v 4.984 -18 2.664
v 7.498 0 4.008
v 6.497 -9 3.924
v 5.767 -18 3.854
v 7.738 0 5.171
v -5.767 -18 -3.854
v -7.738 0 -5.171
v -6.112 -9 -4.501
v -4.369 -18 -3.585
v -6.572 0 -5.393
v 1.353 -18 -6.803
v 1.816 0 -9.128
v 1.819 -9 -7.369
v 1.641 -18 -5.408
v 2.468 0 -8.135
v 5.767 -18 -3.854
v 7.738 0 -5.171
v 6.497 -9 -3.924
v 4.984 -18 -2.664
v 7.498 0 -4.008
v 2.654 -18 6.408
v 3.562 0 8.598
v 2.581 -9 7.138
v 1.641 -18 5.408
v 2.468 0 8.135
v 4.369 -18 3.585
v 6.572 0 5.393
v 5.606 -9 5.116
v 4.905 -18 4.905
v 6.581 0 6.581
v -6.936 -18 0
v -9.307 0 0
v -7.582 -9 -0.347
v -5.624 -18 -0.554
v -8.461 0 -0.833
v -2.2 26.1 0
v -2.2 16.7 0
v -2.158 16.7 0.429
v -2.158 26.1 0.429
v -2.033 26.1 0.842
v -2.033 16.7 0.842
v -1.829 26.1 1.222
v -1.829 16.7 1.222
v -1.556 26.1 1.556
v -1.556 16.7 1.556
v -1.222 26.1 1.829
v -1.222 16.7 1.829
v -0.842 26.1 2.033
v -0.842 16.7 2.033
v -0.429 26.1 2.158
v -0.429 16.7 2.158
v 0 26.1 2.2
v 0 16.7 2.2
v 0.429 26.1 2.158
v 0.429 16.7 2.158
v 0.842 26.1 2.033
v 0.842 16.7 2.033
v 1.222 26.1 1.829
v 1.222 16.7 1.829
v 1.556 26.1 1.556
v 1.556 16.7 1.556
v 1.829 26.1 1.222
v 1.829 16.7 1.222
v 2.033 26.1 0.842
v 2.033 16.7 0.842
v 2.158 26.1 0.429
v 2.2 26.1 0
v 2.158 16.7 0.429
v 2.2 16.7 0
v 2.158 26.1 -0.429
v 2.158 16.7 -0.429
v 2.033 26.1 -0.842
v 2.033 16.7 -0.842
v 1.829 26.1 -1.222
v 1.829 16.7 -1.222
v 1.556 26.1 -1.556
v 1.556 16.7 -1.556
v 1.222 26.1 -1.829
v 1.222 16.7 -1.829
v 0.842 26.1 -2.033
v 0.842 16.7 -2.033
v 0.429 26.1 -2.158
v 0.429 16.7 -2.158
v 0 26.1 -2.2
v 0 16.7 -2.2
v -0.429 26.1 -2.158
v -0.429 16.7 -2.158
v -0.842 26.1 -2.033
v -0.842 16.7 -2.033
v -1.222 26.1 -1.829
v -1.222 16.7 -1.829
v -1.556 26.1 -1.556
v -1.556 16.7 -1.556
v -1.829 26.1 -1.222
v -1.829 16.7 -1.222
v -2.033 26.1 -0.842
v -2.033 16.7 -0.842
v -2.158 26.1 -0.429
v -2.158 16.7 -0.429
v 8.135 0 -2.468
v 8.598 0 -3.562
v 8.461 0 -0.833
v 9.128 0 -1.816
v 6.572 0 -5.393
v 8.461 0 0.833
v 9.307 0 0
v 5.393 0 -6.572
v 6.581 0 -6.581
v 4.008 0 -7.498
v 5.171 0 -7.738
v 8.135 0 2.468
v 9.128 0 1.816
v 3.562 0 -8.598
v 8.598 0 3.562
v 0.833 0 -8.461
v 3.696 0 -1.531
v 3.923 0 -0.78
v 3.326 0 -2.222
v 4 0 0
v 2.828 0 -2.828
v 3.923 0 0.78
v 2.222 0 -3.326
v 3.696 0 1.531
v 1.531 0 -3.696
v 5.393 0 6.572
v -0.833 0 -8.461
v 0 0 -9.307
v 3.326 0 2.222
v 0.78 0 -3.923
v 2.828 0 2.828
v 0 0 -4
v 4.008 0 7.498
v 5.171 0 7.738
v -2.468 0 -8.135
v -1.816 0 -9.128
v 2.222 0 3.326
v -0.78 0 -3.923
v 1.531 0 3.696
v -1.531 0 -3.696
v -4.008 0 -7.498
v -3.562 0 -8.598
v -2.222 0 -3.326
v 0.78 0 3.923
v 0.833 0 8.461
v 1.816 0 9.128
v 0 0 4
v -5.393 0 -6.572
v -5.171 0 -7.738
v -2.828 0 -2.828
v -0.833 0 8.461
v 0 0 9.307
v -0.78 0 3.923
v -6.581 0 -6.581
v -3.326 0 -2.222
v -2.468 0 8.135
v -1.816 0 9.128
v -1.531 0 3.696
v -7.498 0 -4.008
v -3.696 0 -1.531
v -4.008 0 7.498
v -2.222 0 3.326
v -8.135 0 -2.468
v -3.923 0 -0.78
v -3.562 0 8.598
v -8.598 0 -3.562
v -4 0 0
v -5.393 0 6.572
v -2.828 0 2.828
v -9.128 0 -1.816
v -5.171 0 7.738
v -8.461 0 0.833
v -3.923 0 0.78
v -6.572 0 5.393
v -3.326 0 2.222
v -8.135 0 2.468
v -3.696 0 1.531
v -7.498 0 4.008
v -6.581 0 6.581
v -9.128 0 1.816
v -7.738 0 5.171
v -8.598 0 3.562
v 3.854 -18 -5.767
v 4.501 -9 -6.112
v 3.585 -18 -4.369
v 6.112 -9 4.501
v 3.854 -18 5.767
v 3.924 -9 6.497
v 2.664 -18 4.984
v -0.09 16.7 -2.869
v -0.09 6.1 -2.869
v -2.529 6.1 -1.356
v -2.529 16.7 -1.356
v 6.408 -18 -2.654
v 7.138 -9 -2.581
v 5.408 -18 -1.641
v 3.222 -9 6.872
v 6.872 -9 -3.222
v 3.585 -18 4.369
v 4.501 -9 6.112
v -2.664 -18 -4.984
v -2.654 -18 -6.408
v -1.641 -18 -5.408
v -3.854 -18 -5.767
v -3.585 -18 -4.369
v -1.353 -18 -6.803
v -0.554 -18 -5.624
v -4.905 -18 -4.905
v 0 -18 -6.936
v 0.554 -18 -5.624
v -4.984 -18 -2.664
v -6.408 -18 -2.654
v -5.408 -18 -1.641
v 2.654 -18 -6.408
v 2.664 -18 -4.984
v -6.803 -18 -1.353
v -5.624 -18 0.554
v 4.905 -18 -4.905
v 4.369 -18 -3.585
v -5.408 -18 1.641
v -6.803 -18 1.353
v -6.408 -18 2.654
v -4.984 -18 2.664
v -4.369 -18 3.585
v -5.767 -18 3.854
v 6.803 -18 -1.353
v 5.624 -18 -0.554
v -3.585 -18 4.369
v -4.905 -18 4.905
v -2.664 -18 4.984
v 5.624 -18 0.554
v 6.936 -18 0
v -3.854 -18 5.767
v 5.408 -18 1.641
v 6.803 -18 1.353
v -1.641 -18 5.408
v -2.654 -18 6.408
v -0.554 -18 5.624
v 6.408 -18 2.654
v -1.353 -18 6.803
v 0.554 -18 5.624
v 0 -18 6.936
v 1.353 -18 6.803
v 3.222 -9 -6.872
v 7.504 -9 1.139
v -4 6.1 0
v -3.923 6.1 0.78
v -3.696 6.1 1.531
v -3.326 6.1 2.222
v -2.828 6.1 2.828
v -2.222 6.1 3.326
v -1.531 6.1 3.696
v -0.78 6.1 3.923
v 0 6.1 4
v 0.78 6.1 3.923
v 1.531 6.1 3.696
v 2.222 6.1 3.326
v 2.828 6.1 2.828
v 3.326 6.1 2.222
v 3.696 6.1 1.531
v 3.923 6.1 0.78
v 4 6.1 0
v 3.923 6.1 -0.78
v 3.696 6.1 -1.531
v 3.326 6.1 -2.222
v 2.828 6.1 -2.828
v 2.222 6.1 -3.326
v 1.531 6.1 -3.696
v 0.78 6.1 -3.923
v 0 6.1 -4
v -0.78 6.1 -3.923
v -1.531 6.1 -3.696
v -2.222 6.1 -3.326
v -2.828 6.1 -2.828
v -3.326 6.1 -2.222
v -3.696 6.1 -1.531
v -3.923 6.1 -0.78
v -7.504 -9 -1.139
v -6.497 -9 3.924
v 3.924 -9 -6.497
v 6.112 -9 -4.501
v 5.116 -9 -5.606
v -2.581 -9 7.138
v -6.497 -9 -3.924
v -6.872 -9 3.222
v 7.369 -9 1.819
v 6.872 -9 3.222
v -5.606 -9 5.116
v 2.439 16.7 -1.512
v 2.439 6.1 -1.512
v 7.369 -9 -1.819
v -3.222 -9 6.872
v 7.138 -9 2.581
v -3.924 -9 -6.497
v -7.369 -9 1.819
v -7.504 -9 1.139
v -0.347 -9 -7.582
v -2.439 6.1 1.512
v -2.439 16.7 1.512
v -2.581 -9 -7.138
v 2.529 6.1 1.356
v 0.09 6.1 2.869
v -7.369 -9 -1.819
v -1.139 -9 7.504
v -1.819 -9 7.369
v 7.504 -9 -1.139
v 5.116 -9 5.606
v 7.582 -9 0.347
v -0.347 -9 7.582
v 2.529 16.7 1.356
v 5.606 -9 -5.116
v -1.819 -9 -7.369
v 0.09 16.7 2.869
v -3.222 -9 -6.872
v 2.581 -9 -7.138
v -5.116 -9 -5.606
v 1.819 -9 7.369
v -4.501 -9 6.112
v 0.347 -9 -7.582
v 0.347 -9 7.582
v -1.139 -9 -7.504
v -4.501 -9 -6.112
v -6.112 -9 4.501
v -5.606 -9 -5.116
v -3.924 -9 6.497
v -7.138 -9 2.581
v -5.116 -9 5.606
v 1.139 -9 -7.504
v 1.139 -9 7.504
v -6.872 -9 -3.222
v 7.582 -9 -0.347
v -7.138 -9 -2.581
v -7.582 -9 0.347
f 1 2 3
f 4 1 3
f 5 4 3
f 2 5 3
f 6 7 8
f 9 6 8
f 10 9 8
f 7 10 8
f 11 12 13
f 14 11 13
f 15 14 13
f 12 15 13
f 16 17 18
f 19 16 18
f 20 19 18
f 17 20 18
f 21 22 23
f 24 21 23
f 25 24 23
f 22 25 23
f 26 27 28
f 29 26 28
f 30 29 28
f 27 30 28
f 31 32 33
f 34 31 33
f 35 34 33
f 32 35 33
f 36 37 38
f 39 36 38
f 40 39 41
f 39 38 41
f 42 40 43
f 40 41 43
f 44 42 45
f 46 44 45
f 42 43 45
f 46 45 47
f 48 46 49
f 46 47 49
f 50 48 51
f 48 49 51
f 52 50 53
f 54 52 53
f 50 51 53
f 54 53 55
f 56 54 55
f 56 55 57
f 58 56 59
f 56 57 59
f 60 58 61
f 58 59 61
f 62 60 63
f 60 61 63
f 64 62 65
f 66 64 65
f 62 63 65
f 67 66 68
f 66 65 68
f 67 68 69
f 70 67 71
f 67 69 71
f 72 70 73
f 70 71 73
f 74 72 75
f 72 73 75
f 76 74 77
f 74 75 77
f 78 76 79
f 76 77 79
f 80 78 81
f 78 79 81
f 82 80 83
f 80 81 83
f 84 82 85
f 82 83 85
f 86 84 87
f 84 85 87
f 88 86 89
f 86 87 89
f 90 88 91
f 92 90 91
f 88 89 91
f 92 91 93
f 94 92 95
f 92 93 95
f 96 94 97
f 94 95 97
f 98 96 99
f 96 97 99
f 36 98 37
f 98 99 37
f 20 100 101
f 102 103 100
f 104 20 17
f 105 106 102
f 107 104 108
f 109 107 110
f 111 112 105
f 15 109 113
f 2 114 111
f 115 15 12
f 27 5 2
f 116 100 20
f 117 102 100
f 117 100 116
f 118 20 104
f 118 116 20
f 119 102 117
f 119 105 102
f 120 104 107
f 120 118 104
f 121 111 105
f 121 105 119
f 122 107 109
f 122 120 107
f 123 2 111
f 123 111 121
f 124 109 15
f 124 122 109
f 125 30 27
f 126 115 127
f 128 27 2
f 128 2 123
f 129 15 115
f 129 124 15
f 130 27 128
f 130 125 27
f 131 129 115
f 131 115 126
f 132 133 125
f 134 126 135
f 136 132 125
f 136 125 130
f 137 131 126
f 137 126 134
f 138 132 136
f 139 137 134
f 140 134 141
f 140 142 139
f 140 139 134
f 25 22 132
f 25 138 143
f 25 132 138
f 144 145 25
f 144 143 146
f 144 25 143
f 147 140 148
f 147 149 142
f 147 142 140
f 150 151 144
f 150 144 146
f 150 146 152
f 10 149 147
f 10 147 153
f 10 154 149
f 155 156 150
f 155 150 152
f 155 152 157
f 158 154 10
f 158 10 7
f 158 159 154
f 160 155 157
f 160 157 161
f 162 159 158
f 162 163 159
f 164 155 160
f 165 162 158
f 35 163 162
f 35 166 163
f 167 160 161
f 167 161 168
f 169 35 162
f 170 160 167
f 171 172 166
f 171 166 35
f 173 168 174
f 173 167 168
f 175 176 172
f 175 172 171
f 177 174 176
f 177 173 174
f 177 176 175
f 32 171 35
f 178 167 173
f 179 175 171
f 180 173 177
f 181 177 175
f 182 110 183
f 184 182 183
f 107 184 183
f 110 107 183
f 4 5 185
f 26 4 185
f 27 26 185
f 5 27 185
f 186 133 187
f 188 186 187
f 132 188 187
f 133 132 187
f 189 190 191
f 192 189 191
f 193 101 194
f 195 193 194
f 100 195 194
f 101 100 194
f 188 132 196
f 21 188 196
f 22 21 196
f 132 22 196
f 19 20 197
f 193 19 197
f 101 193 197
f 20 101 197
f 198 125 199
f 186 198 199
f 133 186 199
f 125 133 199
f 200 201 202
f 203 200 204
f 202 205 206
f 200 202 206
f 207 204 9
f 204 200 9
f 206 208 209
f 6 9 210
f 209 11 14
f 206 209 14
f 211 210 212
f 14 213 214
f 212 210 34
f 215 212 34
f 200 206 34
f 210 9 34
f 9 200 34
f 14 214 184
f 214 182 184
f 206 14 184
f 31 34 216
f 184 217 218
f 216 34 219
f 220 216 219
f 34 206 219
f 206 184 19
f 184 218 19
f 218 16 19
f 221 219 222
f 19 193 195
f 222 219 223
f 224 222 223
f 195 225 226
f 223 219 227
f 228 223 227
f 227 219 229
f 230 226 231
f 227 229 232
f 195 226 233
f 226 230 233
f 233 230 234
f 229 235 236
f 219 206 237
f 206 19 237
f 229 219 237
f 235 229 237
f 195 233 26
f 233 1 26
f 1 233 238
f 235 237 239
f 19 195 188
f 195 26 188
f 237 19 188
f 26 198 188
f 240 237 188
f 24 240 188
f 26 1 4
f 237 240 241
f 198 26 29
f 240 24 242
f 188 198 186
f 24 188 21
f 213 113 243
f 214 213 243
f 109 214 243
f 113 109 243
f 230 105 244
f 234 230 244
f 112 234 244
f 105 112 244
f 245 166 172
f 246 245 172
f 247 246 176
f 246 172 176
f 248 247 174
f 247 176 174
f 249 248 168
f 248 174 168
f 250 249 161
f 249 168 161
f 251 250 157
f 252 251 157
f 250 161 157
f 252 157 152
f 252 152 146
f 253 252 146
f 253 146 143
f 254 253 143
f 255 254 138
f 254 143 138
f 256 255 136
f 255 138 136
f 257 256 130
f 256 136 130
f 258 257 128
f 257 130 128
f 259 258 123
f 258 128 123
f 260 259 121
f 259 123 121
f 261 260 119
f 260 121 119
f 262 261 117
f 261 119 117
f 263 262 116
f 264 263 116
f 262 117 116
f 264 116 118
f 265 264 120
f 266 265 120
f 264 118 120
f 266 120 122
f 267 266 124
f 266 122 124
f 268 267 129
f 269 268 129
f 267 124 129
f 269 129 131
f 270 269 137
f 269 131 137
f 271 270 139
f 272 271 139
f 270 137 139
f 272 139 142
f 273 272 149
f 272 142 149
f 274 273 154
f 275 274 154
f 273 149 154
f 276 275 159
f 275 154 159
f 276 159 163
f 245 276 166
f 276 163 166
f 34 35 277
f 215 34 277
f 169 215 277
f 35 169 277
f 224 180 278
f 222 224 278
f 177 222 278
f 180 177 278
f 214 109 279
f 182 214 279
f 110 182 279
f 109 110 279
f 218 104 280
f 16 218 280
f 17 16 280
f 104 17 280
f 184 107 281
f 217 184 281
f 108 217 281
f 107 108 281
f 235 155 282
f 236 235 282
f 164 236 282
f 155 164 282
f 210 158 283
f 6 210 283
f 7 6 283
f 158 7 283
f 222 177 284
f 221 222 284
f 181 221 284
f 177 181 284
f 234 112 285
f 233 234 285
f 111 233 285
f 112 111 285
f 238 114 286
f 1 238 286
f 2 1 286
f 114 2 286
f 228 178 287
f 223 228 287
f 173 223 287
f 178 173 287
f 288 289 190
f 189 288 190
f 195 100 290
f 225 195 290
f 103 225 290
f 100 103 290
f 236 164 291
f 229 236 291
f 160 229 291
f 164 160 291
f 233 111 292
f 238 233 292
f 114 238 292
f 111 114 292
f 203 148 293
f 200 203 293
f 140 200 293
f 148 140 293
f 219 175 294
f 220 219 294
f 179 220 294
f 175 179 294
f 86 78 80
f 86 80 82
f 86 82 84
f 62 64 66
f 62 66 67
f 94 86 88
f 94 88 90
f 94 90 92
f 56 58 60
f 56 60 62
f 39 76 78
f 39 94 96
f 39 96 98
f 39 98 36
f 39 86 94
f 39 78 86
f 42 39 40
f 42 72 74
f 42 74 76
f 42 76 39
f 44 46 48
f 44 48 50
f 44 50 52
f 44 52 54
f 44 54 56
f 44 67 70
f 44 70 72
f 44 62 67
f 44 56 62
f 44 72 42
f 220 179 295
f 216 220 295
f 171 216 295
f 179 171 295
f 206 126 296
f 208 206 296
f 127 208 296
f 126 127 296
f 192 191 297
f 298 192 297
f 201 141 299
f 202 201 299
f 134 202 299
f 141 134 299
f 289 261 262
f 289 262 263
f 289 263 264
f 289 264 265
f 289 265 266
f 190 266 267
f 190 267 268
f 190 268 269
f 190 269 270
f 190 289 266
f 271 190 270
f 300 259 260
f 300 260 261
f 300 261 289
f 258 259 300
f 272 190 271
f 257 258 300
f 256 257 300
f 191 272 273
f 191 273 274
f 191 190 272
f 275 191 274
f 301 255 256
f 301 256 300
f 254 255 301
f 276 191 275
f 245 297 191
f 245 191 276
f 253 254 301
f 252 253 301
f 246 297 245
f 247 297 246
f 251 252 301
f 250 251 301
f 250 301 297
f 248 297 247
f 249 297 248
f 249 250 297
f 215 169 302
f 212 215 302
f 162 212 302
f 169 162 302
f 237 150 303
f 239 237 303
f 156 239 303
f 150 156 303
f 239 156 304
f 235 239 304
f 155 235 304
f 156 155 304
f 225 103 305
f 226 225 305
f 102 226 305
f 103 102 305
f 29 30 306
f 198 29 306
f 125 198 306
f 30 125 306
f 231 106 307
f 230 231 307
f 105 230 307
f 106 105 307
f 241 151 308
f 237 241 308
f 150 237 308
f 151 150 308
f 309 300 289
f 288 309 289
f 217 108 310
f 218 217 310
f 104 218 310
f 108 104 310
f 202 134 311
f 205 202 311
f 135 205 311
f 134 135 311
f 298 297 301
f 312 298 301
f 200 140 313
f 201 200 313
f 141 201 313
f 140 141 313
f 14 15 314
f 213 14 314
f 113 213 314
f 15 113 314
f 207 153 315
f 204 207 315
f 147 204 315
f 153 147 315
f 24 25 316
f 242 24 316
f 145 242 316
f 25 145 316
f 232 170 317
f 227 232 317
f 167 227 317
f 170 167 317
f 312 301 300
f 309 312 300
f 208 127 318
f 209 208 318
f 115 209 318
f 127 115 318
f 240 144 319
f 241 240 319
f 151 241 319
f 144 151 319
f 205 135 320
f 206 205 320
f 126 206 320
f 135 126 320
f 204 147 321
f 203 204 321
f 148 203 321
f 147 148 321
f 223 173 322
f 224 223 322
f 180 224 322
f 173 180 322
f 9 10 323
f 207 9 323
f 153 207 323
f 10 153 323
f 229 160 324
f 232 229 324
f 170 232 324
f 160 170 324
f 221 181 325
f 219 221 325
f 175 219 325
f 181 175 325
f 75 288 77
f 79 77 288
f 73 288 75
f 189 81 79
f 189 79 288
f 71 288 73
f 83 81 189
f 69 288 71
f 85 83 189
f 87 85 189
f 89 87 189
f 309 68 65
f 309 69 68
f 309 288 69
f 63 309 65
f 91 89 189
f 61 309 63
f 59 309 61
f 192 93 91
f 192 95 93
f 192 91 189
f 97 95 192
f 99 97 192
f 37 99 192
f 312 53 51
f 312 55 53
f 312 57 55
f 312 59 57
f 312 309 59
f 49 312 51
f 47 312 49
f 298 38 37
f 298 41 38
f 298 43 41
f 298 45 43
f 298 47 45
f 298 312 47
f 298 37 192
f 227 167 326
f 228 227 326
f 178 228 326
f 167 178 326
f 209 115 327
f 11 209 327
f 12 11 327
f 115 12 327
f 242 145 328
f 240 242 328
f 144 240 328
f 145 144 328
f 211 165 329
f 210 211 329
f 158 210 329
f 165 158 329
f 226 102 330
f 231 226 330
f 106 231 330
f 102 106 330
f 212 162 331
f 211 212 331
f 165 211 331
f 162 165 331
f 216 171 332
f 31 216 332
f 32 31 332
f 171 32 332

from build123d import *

# Parameters (mm, degrees)
F0_R      = 8.5
F1_DEPTH  = 18
F1_TAPER  = 9
F2_R      = 4
F3_DEPTH  = 6.1
F5_DEPTH  = 10.6
F6_R      = 2.2
F7_DEPTH  = 9.4
F11_COUNT = 32


with BuildPart() as f1:
    # F0 (on Front) → F1 (new body)
    with BuildSketch(Plane.XZ):
        Circle(F0_R)
    extrude(amount=F1_DEPTH, taper=F1_TAPER)

    # F2 (on face) → F3 (join)
    with BuildSketch(Plane(origin=(0, 0, 0), x_dir=(-1, 0, 0), z_dir=(0, 1, 0))):
        Circle(F2_R)
    extrude(amount=F3_DEPTH)

    # F4 (on face) → F5 (join)
    with BuildSketch(Plane(origin=(0, 6.1, 0), x_dir=(-1, 0, 0), z_dir=(0, 1, 0))):
        Polygon((-0.0899552099, 2.868589908), (-2.5292493383, 1.356391457), (-2.4392941284, -1.512198451), (0.0899552099, -2.868589908), (2.5292493383, -1.356391457), (2.4392941284, 1.512198451), align=None)
    extrude(amount=F5_DEPTH)

    # F6 (on face) → F7 (join)
    with BuildSketch(Plane(origin=(0, 16.7, 0), x_dir=(-1, 0, 0), z_dir=(0, 1, 0))):
        Circle(F6_R)
    extrude(amount=F7_DEPTH)



with BuildPart() as f10:
    # F9 (on face) → F10 section 0
    with BuildSketch(Plane.XZ.offset(18)):
        with BuildLine():
            Line((0.555, 5.6217506779), (0, 6.9361673668))
            Line((0, 6.9361673668), (-0.555, 5.6217506779))
            ThreePointArc((-0.555, 5.6217506779), (0, 5.6490800742), (0.555, 5.6217506779))
        make_face()
    # F8 (on Front) → F10 section 1
    with BuildSketch(Plane.XZ):
        Polygon((0.835, 8.4588873382), (0, 9.3067523038), (-0.835, 8.4588873382), align=None)
    loft()


with BuildPart() as f1_1:
    add(f1.part)

    add(f10.part)  # F11 merges F10
    # F11: F10 ×32 about axis
    f11_axis = Axis((0, -18, 0), (0, 1, 0))
    for i in range(1, F11_COUNT):
        add(f10.part.rotate(f11_axis, i * 360 / F11_COUNT))


solid = f1_1.part
